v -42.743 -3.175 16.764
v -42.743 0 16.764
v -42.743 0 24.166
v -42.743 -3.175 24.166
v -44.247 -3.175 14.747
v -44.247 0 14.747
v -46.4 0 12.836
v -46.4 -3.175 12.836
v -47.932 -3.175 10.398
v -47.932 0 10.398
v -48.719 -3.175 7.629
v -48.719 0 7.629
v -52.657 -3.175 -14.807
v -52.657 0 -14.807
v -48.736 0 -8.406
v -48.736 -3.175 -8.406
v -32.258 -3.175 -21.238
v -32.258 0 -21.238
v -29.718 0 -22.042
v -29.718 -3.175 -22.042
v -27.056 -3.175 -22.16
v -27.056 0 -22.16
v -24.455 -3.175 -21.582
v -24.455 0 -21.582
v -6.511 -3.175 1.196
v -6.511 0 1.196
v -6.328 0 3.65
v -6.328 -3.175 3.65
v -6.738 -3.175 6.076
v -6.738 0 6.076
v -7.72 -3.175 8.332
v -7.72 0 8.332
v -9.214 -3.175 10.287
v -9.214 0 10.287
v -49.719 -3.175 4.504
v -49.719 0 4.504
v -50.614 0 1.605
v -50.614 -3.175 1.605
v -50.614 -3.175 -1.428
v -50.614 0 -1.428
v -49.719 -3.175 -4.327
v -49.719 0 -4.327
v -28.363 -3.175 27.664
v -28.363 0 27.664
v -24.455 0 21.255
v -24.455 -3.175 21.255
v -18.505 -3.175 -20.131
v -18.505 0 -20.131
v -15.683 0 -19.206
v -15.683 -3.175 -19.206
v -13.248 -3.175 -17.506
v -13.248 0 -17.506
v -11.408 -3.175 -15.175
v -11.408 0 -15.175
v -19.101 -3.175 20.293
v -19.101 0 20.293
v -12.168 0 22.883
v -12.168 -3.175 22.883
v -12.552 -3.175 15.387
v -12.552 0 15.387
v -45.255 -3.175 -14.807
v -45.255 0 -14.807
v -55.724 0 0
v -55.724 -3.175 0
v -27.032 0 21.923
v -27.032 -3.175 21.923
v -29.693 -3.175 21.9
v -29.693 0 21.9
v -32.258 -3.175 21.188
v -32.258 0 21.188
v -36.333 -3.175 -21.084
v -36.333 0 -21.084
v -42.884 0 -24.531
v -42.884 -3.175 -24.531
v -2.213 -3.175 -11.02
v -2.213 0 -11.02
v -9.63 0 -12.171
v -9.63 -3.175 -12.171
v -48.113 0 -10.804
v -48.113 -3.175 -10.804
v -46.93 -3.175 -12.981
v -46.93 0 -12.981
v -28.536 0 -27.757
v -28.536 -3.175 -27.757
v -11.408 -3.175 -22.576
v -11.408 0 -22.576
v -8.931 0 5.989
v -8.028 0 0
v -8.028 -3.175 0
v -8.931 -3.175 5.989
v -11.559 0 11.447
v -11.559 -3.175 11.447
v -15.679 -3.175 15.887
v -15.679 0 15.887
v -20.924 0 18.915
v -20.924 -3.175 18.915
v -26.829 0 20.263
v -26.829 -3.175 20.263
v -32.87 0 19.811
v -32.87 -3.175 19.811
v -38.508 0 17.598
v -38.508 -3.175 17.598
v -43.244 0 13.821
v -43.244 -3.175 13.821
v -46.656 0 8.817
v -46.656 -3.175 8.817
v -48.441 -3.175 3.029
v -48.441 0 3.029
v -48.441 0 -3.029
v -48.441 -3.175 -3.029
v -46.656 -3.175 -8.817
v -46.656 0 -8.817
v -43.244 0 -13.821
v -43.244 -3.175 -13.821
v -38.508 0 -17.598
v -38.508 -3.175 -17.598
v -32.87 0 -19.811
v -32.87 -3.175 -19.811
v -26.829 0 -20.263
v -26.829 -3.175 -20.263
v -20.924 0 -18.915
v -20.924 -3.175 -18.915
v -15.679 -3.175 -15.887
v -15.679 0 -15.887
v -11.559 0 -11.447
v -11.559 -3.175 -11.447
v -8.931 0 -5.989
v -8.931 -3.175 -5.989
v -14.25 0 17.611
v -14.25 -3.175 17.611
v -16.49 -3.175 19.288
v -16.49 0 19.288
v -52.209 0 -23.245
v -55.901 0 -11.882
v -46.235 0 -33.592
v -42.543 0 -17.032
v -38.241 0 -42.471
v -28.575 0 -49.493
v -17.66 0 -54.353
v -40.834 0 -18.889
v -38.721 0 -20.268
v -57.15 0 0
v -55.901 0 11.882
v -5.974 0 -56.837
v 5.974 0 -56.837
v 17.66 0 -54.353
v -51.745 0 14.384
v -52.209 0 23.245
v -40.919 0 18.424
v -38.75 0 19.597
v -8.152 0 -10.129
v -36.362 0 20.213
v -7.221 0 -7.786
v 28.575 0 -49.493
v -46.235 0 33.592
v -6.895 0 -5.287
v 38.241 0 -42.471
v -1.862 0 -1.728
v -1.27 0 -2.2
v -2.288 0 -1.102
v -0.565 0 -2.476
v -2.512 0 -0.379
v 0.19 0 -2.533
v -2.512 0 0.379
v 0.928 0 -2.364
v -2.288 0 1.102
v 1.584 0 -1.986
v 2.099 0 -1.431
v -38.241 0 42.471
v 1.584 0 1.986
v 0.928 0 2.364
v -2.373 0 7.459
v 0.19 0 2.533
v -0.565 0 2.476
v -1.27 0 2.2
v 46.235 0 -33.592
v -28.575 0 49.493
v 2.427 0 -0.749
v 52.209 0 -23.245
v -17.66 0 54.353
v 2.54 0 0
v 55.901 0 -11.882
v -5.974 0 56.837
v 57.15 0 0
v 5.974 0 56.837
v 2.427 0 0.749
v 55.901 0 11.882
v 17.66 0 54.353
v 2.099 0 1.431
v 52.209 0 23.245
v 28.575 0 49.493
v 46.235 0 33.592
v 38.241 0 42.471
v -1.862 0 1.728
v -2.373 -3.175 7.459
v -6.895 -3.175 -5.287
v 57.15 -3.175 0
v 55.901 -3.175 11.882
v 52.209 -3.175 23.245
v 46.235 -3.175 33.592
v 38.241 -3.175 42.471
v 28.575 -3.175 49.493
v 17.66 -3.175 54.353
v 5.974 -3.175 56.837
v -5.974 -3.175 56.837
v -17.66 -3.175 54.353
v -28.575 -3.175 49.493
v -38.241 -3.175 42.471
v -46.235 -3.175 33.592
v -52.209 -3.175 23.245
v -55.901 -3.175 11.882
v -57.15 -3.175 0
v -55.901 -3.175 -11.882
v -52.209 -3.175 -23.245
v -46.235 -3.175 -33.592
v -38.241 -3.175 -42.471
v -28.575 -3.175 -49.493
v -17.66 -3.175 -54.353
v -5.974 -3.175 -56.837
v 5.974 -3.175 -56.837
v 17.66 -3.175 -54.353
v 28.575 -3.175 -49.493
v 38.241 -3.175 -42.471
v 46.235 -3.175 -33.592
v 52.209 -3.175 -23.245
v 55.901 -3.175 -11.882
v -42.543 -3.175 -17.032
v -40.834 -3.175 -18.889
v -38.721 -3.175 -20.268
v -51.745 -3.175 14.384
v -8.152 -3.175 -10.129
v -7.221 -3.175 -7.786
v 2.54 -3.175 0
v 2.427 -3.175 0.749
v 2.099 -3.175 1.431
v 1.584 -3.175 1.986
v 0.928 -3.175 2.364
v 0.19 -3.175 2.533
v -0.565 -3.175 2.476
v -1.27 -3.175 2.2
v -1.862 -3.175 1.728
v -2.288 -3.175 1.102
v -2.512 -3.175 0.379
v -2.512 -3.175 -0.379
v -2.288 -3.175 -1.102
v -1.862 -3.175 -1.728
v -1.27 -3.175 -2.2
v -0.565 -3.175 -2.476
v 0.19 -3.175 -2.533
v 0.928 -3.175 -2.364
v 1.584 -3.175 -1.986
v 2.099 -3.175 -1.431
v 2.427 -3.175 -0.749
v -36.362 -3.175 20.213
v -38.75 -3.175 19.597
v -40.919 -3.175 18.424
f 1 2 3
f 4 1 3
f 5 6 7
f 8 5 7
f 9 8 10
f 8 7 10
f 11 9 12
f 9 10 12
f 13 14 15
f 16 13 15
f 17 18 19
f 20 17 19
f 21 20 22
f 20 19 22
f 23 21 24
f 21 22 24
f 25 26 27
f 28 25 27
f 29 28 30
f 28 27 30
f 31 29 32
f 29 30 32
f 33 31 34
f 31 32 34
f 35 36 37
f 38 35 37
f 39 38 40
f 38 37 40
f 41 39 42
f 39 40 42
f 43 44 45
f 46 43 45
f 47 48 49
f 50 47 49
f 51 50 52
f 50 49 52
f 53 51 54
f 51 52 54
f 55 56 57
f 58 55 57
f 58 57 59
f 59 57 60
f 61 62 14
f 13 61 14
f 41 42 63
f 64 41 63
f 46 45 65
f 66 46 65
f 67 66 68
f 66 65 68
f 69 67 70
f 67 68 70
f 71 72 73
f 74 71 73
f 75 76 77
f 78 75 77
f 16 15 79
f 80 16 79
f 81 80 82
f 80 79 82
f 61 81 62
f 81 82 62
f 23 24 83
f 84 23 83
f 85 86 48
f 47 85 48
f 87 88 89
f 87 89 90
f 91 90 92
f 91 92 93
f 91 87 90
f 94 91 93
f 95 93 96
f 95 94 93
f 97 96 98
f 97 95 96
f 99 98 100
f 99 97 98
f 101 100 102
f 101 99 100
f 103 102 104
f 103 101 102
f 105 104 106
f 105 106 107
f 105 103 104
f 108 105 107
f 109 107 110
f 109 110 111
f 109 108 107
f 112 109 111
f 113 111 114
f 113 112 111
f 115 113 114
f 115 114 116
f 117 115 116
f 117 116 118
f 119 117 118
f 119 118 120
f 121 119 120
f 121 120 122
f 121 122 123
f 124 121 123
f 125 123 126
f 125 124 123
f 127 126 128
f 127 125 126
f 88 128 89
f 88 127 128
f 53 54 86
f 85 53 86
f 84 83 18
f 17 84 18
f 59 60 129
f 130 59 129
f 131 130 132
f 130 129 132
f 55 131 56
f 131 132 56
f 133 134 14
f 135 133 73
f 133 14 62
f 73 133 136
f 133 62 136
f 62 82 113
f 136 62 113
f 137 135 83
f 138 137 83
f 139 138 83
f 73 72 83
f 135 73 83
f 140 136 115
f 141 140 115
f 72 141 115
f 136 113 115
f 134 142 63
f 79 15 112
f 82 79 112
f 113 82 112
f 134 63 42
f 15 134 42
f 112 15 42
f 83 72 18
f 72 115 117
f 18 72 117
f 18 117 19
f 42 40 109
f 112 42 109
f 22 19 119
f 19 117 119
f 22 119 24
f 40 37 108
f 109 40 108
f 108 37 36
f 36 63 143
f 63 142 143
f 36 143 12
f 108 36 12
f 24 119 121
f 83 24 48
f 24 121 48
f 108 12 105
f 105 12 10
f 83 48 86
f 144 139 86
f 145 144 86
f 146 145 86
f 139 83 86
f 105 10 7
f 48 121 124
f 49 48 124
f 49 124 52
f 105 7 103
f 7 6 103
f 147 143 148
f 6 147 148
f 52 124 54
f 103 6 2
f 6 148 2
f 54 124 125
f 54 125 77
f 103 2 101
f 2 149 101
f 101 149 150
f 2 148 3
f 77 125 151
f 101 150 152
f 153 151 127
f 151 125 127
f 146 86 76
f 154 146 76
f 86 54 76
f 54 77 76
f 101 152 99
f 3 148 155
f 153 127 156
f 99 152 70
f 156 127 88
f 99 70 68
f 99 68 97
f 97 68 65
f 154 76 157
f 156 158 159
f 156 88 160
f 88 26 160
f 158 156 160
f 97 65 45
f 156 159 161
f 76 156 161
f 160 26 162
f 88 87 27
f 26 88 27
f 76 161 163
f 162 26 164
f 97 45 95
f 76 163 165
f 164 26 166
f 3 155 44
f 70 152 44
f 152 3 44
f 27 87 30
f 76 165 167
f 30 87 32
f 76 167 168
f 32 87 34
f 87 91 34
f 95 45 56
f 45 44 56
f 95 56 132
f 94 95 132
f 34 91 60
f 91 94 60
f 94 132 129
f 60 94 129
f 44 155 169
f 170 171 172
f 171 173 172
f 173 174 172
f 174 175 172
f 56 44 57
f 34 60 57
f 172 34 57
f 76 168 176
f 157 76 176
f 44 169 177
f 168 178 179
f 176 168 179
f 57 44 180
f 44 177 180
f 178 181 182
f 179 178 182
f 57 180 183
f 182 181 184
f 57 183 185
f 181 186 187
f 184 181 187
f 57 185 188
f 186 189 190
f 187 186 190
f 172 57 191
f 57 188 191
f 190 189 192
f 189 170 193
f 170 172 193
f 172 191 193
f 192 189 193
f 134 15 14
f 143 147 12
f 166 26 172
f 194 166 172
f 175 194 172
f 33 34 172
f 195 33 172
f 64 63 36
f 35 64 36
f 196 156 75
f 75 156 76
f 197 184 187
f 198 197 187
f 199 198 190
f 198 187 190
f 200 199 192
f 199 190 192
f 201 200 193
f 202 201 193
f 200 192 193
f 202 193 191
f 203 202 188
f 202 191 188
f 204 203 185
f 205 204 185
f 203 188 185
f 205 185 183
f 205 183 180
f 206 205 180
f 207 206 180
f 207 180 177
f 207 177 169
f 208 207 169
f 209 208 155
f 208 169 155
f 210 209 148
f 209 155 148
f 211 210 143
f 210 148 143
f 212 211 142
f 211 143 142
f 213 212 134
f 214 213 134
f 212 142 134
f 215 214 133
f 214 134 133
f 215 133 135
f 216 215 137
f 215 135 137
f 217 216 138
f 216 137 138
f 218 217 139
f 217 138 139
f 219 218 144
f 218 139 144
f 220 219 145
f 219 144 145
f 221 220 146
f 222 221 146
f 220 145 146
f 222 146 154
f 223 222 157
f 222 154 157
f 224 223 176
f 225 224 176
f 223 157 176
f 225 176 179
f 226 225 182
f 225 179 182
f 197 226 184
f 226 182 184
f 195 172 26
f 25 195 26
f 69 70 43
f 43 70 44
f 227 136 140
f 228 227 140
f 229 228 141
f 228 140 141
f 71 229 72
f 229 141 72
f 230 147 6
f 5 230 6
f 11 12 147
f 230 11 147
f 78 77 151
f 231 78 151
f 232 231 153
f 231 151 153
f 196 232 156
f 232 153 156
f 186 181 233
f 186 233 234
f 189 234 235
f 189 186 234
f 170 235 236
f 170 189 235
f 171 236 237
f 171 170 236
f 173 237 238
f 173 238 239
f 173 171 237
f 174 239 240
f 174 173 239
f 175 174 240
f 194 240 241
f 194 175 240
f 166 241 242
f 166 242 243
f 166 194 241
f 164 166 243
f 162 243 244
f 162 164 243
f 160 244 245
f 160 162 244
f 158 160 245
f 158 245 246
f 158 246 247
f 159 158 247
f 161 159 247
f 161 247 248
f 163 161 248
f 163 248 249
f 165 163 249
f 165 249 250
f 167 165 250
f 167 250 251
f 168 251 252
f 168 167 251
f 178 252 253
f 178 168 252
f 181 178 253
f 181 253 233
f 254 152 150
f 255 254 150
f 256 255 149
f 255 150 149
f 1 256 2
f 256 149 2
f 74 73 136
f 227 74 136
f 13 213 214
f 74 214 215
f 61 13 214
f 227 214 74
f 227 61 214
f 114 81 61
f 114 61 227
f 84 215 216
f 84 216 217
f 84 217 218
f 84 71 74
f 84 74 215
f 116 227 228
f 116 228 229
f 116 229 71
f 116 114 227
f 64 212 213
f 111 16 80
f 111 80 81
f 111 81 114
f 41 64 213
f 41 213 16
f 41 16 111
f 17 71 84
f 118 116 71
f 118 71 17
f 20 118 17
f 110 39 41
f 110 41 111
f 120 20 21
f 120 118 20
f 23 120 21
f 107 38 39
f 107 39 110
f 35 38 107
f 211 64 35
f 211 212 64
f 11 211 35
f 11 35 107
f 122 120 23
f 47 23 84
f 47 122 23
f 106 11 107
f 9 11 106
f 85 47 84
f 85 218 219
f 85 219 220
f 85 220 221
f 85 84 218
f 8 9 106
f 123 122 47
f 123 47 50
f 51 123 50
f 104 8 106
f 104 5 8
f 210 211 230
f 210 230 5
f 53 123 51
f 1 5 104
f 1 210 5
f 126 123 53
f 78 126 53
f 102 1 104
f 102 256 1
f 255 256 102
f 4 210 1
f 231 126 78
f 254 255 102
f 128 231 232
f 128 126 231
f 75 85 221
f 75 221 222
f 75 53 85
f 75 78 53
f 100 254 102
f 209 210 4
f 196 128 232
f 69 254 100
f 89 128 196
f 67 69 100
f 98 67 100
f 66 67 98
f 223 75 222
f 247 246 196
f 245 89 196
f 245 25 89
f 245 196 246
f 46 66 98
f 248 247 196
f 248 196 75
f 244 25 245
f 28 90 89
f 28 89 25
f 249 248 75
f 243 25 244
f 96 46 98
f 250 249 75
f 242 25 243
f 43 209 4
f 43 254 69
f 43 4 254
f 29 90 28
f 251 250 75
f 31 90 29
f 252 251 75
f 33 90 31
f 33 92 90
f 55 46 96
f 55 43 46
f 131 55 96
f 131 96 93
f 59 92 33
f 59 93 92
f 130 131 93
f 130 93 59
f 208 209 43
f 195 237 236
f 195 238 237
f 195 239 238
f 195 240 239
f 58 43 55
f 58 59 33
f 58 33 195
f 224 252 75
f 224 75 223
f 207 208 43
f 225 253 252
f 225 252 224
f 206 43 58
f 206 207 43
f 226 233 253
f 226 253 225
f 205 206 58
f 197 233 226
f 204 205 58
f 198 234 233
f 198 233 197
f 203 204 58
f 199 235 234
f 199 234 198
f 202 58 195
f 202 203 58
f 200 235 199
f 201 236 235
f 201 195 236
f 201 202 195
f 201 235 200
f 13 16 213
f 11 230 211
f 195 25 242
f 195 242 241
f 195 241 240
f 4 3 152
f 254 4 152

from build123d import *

# Parameters (mm, degrees)
F0_R     = 57.15
F0_R_2   = 20.32
F0_R_3   = 2.54
F1_DEPTH = 3.175


with BuildPart() as f1:
    # F0 (on Front) → F1 (new body)
    with BuildSketch(Plane.XZ):
        Circle(F0_R)
        with BuildLine():
            Line((-42.883825, -24.53093), (-42.543459, -17.032195))
            ThreePointArc((-42.543459, -17.032195), (-39.820724, -19.644048), (-36.333463, -21.084213))
            Line((-36.333463, -21.084213), (-42.883825, -24.53093))
        make_face(mode=Mode.SUBTRACT)
        with BuildLine():
            Line((-52.656993, -14.806859), (-48.735586, -8.406121))
            ThreePointArc((-48.735586, -8.406121), (-47.587931, -11.928695), (-45.255162, -14.806859))
            Line((-45.255162, -14.806859), (-52.656993, -14.806859))
        make_face(mode=Mode.SUBTRACT)
        with BuildLine():
            Line((-28.536372, -27.7573), (-32.257507, -21.238095))
            ThreePointArc((-32.257507, -21.238095), (-28.390723, -22.188544), (-24.455277, -21.582207))
            Line((-24.455277, -21.582207), (-28.536372, -27.7573))
        make_face(mode=Mode.SUBTRACT)
        with BuildLine():
            Line((-11.408226, -22.576399), (-18.505276, -20.131249))
            ThreePointArc((-18.505276, -20.131249), (-14.403329, -18.445306), (-11.408226, -15.174568))
            Line((-11.408226, -15.174568), (-11.408226, -22.576399))
        make_face(mode=Mode.SUBTRACT)
        with BuildLine():
            Line((-2.212769, -11.019517), (-9.630398, -12.170889))
            ThreePointArc((-9.630398, -12.170889), (-7.613739, -8.986542), (-6.894672, -5.286552))
            Line((-6.894672, -5.286552), (-2.212769, -11.019517))
        make_face(mode=Mode.SUBTRACT)
        with BuildLine():
            Line((-55.724405, 0), (-49.719241, 4.503874))
            ThreePointArc((-49.719241, 4.503874), (-50.727289, 0.088311), (-49.719241, -4.327252))
            Line((-49.719241, -4.327252), (-55.724405, 0))
        make_face(mode=Mode.SUBTRACT)
        with BuildLine():
            Line((-51.745173, 14.383817), (-44.247499, 14.746812))
            ThreePointArc((-44.247499, 14.746812), (-47.252569, 11.671197), (-48.718844, 7.628934))
            Line((-48.718844, 7.628934), (-51.745173, 14.383817))
        make_face(mode=Mode.SUBTRACT)
        with BuildLine():
            Line((-42.743142, 24.165609), (-36.361622, 20.213004))
            ThreePointArc((-36.361622, 20.213004), (-39.870209, 19.076412), (-42.743142, 16.763777))
            Line((-42.743142, 16.763777), (-42.743142, 24.165609))
        make_face(mode=Mode.SUBTRACT)
        with Locations((-28.347915, 0)):
            Circle(F0_R_2, mode=Mode.SUBTRACT)
        with BuildLine():
            Line((-2.37326, 7.45949), (-6.511062, 1.196466))
            ThreePointArc((-6.511062, 1.196466), (-6.73835, 6.076043), (-9.213608, 10.287341))
            Line((-9.213608, 10.287341), (-2.37326, 7.45949))
        make_face(mode=Mode.SUBTRACT)
        with BuildLine():
            Line((-12.167714, 22.883349), (-12.55219, 15.386746))
            ThreePointArc((-12.55219, 15.386746), (-15.311854, 18.527025), (-19.101316, 20.292545))
            Line((-19.101316, 20.292545), (-12.167714, 22.883349))
        make_face(mode=Mode.SUBTRACT)
        with BuildLine():
            Line((-28.363025, 27.663627), (-24.455277, 21.25454))
            ThreePointArc((-24.455277, 21.25454), (-28.363025, 21.998871), (-32.257507, 21.18799))
            Line((-32.257507, 21.18799), (-28.363025, 27.663627))
        make_face(mode=Mode.SUBTRACT)
        Circle(F0_R_3, mode=Mode.SUBTRACT)
    extrude(amount=F1_DEPTH)


solid = f1.part
